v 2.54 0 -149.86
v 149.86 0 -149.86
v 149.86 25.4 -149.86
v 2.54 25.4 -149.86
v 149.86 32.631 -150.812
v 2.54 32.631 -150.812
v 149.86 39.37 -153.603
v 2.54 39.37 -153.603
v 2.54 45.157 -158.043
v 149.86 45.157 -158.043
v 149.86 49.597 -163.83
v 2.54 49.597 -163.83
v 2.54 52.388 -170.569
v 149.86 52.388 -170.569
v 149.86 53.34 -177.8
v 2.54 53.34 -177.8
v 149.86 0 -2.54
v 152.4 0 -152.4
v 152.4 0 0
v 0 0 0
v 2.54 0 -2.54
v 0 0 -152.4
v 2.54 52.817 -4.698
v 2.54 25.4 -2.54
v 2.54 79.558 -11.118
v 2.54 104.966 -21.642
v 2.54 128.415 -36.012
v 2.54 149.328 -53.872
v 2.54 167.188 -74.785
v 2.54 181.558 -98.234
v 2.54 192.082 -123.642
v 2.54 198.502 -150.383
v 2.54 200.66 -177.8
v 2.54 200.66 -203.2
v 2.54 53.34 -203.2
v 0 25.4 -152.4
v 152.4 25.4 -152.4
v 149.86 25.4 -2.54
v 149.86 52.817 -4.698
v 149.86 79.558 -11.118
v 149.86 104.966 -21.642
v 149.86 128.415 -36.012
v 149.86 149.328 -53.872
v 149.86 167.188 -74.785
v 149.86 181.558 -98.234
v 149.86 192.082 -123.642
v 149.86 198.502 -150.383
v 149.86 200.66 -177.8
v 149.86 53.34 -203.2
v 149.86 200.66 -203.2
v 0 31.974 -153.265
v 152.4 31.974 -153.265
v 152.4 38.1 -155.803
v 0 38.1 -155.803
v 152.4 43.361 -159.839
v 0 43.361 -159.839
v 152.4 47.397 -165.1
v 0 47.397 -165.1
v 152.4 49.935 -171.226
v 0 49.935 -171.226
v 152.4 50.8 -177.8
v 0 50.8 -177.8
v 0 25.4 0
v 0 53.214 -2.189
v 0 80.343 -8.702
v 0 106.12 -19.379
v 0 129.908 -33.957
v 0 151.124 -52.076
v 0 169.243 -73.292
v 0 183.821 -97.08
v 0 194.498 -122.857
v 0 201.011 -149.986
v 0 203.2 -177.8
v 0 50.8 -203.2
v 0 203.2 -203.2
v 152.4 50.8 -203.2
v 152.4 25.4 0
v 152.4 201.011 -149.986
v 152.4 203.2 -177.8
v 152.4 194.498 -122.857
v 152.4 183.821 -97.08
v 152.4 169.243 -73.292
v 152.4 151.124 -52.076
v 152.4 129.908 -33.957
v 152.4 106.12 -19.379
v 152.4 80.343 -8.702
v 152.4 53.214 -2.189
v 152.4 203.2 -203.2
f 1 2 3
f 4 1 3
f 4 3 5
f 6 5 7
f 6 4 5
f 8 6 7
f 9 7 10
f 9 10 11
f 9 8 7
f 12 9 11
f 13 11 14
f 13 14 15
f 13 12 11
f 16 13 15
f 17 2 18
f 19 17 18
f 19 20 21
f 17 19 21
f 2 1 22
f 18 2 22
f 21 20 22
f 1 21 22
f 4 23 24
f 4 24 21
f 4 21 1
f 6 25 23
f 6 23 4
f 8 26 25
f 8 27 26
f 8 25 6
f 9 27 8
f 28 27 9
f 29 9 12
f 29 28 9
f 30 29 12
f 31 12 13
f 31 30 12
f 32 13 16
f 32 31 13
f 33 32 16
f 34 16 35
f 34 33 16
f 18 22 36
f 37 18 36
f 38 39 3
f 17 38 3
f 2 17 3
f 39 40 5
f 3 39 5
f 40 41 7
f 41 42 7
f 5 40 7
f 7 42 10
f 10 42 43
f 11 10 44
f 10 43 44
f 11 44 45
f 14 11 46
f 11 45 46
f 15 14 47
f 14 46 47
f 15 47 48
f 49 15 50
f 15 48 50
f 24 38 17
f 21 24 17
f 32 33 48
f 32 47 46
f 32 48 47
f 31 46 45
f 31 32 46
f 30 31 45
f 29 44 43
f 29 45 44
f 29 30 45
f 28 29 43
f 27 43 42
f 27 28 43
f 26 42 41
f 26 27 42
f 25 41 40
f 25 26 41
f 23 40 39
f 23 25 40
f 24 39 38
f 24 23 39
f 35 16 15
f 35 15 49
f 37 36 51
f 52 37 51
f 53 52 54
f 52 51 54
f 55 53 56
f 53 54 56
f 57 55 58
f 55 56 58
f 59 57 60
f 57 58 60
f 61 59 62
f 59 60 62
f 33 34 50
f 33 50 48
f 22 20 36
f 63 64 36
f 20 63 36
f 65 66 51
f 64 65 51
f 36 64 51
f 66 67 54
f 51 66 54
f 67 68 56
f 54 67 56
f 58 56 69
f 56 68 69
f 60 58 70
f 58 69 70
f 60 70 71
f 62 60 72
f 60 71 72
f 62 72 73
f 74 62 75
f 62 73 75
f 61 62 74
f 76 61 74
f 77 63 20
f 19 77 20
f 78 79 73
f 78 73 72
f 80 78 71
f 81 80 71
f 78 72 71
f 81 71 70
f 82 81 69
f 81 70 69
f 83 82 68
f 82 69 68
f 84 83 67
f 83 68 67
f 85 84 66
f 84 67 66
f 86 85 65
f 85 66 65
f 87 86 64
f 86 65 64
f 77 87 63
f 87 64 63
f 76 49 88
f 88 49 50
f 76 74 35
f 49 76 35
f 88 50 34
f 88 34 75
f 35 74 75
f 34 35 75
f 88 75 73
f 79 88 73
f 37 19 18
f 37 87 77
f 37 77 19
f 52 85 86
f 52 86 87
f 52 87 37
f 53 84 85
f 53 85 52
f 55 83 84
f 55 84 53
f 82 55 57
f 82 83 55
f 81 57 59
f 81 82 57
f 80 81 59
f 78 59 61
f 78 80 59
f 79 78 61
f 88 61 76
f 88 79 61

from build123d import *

# Parameters (mm, degrees)
BOSS_EXTRUDE1_DEPTH = 152.4
SHELL1_T            = -2.54
SKETCH2_W           = 147.32
SKETCH2_H           = 147.32
CUT_EXTRUDE2_DEPTH  = 152.4


with BuildPart() as part:
    # Sketch1 → Boss-Extrude1 (new body)
    with BuildSketch(Plane(origin=(0, 0, 0), x_dir=(0, 0, -1), z_dir=(1, 0, 0))):
        with BuildLine():
            Line((0, 0), (152.4, 0))
            Line((152.4, 0), (152.4, 25.4))
            ThreePointArc((152.4, 25.4), (159.839487758, 43.360512242), (177.8, 50.8))
            Line((177.8, 50.8), (203.2, 50.8))
            Line((203.2, 50.8), (203.2, 203.2))
            Line((203.2, 203.2), (177.8, 203.2))
            ThreePointArc((177.8, 203.2), (52.076414305, 151.123585695), (0, 25.4))
            Line((0, 25.4), (0, 0))
        make_face()
    extrude(amount=BOSS_EXTRUDE1_DEPTH)

    # Shell1
    shell1_openings = [part.faces().sort_by_distance(p)[0] for p in [
        (76.2, 127, -203.2),
    ]]
    offset(amount=SHELL1_T, openings=shell1_openings, kind=Kind.INTERSECTION)

    # Sketch2 → Cut-Extrude2 (cut)
    with BuildSketch(Plane(origin=(0, 2.54, 0), x_dir=(1, 0, 0), z_dir=(0, 1, 0))):
        with Locations((76.2, 76.2)):
            Rectangle(SKETCH2_W, SKETCH2_H)
    extrude(amount=-CUT_EXTRUDE2_DEPTH, mode=Mode.SUBTRACT)


solid = part.part
